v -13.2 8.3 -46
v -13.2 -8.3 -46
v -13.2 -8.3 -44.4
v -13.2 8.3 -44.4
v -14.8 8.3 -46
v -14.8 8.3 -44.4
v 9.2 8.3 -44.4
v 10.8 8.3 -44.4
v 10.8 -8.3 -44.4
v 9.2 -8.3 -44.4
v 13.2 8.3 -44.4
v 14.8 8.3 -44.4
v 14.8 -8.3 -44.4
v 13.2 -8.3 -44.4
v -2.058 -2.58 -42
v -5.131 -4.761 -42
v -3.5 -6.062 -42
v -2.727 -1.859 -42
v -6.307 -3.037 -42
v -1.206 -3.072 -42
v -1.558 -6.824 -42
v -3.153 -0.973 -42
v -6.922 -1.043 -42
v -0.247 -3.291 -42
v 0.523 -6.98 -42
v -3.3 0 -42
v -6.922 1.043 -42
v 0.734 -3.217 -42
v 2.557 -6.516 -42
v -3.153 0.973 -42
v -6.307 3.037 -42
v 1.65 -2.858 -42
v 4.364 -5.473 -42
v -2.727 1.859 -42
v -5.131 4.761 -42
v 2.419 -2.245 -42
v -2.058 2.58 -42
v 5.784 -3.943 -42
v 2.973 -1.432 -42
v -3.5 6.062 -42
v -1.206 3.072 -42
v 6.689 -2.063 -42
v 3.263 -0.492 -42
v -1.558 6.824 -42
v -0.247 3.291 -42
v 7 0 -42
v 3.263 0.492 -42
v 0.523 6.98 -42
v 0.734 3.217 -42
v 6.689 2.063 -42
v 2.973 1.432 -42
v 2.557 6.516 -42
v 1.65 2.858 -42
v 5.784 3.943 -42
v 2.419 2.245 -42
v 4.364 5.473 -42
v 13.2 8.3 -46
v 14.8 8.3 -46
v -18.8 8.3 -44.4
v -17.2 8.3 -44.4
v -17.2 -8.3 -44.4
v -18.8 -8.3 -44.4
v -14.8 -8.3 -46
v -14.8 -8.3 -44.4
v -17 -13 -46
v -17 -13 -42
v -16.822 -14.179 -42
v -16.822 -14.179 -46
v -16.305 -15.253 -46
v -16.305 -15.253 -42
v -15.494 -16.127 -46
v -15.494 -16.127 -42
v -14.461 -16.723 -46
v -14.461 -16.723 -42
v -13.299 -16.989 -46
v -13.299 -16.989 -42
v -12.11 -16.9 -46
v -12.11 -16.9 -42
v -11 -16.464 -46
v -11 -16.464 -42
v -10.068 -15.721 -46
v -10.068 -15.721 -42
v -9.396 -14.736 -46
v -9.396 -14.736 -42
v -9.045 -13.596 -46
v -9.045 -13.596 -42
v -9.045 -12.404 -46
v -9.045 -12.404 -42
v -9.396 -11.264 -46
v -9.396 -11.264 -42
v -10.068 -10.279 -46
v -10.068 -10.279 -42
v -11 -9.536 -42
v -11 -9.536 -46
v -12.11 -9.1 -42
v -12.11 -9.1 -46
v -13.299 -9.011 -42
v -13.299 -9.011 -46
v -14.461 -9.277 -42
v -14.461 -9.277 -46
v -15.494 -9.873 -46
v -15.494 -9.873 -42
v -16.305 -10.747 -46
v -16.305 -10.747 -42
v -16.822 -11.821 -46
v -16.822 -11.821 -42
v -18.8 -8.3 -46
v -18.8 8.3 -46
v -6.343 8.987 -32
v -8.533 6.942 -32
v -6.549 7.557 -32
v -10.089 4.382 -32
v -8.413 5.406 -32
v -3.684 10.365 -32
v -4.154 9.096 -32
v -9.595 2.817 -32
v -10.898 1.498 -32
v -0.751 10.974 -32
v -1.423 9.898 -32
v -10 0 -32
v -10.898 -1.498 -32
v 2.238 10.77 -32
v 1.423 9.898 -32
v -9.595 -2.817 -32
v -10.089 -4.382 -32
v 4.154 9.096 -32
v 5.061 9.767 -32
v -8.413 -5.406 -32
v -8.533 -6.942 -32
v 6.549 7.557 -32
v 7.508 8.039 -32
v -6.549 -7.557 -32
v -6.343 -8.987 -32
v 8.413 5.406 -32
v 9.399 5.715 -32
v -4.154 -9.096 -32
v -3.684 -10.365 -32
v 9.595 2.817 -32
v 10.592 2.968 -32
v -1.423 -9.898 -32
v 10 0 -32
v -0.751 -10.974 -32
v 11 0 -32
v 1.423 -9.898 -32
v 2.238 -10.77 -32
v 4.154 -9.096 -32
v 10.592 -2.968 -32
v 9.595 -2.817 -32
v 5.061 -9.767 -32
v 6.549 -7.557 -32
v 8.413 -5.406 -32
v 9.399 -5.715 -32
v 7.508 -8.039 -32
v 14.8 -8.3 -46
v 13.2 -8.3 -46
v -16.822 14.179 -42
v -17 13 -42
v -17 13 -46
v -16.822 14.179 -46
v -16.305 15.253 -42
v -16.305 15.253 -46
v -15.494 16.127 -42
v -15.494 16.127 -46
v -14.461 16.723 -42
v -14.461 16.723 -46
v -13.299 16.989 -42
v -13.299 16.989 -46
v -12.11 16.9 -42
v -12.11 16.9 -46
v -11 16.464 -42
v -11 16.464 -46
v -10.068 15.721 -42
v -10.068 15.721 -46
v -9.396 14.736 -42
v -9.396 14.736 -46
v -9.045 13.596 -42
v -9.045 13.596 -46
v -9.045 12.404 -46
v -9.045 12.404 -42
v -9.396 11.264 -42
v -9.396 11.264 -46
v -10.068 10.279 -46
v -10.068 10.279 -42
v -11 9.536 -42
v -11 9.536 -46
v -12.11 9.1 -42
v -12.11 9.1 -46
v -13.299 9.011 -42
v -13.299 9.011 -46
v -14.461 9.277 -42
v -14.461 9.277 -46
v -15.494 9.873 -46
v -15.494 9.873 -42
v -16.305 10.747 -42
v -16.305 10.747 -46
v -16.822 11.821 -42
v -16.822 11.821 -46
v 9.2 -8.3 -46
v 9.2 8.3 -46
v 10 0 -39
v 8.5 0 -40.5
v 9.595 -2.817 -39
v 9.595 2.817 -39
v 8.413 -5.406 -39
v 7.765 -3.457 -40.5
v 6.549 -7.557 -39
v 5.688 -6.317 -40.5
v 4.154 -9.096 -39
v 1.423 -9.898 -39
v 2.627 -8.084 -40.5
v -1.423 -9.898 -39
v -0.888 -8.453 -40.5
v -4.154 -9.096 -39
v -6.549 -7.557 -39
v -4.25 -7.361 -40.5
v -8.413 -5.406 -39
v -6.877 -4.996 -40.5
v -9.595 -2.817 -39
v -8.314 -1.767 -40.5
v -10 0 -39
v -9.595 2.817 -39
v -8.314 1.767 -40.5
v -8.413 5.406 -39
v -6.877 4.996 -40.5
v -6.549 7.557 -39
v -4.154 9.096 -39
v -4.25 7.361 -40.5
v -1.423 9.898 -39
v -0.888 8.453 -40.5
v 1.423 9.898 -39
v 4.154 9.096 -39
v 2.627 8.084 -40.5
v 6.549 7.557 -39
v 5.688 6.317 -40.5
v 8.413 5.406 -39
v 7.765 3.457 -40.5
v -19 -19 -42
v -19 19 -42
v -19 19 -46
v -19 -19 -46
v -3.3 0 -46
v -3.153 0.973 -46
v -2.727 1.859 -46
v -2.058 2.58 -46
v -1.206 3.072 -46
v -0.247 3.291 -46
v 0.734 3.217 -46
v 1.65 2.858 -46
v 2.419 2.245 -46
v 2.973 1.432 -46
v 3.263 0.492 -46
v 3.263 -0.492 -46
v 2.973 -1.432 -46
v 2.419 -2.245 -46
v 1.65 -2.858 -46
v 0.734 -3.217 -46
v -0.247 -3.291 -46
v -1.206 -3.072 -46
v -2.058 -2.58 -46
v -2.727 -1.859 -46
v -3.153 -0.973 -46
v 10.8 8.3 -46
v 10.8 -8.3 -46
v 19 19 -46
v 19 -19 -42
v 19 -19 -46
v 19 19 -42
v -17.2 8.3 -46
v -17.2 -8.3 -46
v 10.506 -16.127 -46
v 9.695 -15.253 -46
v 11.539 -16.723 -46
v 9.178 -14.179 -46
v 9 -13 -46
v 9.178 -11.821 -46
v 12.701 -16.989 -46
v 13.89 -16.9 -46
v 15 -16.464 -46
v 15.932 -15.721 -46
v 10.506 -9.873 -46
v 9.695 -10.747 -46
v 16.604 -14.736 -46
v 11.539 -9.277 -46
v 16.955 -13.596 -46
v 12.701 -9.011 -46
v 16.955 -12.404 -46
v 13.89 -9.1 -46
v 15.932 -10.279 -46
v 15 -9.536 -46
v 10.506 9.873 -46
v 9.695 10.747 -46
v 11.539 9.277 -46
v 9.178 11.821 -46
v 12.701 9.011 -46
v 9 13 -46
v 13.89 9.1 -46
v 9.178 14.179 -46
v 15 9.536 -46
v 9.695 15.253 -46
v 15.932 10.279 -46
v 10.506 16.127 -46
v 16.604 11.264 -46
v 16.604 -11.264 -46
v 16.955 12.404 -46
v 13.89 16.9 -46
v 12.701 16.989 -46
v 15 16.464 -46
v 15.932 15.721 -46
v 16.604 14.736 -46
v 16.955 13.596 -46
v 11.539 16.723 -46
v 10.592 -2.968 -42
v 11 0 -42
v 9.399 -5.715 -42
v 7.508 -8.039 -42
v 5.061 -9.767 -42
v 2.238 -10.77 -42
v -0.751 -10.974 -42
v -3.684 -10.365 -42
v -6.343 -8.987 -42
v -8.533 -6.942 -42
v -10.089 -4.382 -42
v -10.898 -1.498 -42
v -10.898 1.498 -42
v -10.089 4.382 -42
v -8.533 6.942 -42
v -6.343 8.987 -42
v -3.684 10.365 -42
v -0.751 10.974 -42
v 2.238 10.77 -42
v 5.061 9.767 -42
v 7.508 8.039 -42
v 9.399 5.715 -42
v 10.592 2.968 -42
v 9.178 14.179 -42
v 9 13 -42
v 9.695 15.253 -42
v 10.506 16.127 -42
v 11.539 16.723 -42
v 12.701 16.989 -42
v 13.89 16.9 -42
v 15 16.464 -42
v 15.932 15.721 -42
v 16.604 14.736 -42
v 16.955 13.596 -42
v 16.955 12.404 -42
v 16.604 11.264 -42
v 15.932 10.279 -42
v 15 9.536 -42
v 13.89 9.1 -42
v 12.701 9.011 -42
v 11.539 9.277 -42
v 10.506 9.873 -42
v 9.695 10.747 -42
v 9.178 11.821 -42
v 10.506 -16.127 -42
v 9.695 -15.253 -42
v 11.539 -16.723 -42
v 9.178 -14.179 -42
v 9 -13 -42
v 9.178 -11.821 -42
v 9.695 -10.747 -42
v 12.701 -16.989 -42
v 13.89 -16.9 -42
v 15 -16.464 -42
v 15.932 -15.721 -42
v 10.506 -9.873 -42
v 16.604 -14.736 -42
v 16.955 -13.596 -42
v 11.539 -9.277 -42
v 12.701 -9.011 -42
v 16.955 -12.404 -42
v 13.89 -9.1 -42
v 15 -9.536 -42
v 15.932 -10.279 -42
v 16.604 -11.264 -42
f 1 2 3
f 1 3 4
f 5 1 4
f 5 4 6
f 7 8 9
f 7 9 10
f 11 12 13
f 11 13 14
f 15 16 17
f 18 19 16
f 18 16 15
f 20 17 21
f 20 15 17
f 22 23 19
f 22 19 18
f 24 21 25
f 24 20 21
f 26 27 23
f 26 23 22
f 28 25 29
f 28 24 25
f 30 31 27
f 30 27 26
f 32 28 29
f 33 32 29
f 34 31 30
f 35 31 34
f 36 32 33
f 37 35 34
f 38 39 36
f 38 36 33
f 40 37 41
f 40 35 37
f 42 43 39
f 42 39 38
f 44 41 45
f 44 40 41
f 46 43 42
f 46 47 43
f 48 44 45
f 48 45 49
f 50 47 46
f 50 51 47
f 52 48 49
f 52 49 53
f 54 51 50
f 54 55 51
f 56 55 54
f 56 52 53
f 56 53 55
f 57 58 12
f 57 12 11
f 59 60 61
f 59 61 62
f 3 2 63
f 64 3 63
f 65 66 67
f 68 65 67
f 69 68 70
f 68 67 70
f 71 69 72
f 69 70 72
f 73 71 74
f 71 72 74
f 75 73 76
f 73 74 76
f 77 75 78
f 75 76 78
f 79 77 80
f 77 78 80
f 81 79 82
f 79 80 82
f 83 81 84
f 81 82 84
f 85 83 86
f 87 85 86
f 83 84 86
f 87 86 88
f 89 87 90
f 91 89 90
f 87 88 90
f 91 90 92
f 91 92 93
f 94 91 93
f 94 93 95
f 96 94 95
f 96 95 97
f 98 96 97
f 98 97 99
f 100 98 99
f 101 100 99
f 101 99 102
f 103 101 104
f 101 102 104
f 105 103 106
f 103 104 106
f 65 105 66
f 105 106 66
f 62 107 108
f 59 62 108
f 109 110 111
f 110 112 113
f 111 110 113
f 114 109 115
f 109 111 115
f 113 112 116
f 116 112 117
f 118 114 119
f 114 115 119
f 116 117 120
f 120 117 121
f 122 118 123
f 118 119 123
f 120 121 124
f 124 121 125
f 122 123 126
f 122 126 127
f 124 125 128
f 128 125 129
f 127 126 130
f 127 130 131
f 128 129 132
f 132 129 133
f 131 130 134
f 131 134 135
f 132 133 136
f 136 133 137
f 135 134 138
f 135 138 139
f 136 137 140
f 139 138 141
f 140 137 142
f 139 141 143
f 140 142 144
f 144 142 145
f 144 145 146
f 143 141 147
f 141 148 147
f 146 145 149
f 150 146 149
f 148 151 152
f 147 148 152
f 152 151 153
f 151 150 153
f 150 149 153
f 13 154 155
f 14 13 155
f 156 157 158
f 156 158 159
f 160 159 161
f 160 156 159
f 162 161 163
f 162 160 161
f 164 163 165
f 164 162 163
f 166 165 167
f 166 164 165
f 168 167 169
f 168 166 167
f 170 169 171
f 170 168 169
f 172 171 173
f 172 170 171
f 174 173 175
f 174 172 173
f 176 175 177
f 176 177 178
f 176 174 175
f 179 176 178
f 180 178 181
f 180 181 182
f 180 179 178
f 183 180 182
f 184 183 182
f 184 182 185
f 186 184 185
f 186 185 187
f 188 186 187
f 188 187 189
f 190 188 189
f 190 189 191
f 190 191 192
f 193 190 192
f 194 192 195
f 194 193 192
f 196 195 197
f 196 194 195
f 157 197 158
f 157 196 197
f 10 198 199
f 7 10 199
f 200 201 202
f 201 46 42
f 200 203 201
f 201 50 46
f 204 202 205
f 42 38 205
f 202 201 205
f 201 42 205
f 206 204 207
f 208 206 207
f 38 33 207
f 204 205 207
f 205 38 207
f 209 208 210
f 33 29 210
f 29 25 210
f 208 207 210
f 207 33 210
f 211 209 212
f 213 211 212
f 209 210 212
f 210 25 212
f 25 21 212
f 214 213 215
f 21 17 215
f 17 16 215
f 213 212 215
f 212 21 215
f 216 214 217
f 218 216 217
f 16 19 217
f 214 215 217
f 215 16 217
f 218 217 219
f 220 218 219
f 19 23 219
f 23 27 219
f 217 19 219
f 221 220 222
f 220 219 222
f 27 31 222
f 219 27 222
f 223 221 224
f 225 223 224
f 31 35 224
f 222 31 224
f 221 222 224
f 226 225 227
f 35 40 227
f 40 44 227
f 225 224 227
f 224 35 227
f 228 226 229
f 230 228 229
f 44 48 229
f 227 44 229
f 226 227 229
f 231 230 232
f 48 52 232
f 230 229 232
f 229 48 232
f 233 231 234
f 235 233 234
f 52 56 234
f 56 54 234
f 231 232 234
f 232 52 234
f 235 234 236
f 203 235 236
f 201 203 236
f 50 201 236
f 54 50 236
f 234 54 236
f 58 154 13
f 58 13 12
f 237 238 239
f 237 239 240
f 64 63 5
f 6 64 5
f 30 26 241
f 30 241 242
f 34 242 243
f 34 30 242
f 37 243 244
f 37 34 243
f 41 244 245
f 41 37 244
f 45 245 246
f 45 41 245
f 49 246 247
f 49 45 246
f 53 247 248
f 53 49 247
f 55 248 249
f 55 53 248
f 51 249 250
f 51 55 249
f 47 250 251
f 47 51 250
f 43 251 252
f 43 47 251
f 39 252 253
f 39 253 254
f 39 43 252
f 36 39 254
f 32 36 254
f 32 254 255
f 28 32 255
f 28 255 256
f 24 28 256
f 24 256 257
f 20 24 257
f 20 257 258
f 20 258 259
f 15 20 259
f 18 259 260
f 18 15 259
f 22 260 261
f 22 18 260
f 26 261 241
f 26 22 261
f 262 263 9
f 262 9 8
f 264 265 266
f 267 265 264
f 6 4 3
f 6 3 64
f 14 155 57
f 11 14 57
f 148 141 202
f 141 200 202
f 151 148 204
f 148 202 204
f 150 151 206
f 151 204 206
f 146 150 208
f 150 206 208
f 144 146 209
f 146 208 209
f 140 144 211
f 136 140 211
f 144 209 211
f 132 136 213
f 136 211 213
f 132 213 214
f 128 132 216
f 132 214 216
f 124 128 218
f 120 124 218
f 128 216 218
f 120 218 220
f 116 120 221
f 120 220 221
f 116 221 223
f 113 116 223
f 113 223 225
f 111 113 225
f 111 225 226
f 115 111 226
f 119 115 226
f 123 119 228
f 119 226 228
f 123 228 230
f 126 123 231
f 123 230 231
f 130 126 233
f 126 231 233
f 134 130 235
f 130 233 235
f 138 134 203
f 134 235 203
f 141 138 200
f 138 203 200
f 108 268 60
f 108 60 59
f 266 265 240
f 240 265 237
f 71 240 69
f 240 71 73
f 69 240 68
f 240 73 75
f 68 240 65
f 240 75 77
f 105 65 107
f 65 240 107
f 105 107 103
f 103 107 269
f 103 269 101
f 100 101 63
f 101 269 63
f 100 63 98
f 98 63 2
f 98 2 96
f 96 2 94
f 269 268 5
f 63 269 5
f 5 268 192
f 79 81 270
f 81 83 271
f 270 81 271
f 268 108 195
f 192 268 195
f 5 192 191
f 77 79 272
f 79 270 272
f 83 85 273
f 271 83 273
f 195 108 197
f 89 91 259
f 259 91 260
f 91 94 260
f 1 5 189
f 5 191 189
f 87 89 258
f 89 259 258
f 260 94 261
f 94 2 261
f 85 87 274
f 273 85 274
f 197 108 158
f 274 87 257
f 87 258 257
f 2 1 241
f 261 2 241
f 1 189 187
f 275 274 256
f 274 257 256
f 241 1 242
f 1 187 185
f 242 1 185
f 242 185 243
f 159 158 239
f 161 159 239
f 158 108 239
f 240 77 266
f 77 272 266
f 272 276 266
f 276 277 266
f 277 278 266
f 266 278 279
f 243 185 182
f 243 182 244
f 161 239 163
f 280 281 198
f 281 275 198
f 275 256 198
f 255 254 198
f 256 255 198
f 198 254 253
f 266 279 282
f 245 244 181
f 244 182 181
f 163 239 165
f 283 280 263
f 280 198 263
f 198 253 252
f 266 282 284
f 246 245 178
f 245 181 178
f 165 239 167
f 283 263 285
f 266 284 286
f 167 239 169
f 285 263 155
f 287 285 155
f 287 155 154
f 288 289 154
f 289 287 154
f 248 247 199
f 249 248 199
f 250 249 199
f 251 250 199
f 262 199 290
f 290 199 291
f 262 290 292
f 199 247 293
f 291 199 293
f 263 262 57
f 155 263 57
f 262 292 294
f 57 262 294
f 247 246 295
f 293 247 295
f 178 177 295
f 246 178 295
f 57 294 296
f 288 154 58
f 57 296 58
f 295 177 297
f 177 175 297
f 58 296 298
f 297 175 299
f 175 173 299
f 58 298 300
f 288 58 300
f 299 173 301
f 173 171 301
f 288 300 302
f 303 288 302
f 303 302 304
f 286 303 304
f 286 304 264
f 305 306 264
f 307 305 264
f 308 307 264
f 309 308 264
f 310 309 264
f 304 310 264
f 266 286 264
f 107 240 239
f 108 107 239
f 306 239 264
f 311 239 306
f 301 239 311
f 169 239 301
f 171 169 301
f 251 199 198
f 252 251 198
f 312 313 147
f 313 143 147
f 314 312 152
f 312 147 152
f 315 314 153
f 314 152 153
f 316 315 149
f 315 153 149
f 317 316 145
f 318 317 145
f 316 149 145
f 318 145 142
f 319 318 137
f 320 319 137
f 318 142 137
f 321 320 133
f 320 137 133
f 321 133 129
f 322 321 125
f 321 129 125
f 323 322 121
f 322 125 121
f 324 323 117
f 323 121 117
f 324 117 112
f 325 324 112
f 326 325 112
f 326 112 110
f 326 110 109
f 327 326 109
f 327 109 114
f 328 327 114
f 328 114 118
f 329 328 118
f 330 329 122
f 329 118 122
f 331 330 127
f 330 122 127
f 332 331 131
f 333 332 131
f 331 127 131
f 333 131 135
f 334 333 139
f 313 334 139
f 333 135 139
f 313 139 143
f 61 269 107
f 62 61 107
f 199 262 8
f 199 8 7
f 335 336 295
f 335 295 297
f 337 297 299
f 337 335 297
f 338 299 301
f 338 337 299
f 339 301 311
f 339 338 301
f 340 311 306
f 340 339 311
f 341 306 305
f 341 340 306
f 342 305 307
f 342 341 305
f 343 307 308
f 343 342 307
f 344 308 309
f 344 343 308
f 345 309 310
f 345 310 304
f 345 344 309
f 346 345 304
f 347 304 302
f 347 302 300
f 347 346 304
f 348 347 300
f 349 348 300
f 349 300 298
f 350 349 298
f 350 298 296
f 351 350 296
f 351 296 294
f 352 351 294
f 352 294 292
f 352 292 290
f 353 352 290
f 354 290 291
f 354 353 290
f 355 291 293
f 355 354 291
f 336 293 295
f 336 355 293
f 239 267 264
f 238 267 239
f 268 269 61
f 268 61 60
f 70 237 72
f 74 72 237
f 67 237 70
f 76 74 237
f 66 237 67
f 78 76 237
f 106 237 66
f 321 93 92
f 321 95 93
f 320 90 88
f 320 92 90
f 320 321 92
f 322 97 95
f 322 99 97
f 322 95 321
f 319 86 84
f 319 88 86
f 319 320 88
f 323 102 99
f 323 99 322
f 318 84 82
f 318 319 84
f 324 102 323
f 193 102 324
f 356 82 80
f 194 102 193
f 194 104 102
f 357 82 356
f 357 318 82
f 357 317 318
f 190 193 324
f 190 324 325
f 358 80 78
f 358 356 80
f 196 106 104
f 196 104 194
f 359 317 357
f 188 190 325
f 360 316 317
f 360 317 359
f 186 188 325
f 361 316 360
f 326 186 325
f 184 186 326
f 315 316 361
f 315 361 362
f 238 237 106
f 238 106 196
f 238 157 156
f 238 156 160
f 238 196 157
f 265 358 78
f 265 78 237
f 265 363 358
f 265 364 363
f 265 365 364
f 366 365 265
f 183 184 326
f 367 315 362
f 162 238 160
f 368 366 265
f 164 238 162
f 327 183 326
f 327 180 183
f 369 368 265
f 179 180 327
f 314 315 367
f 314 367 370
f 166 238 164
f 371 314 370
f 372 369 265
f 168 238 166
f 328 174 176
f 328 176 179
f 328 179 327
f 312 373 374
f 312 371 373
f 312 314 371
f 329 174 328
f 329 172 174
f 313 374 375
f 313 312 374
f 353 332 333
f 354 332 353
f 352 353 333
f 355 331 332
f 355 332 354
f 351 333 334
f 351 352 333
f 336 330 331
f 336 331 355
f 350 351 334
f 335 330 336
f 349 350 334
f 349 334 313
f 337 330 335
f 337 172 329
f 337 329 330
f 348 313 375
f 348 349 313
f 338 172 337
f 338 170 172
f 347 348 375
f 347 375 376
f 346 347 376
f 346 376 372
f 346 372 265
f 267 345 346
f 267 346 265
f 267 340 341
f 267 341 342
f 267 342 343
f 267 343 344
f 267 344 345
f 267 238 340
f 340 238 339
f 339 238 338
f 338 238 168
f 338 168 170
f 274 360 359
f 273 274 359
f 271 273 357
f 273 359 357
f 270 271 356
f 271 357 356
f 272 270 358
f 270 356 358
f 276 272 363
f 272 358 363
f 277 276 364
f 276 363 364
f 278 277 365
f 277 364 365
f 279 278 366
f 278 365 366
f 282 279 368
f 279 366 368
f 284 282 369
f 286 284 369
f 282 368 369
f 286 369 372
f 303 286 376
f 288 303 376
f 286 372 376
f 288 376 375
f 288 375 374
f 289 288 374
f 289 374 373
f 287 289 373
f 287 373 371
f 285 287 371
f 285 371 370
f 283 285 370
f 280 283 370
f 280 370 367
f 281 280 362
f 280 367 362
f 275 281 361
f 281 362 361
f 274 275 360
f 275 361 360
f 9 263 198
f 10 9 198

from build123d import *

# Parameters (mm, degrees)
SKETCH012_W             = 1.6
SKETCH012_H             = 8.3
EXTRUDE011_DEPTH        = 1.6
SKETCH008_R             = 4
EXTRUDE007_DEPTH        = 4
BODY004_PLACEMENT_ANGLE = 180


with BuildPart() as extrude011:
    # Sketch012 → Extrude011 (new body)
    with BuildSketch(Plane.XY.offset(5)):
        with Locations((14, 4.15)):
            Rectangle(SKETCH012_W, SKETCH012_H)
        with Locations((18, 4.15)):
            Rectangle(SKETCH012_W, SKETCH012_H)
        with Locations((-10, 4.15)):
            Rectangle(SKETCH012_W, SKETCH012_H)
        with Locations((-14, 4.15)):
            Rectangle(SKETCH012_W, SKETCH012_H)
    extrude(amount=-EXTRUDE011_DEPTH)


with BuildPart() as extrude011_1:
    # Extrude011 placement: moved
    add(extrude011.part.moved(Location((0, 0, -1))))


with BuildPart() as cut:
    # Sketch008 → Extrude007 (new body)
    with BuildSketch(Plane.XY):
        with BuildLine():
            ThreePointArc((3.3, 0), (0, 3.3), (-3.3, 0))
            Line((-3.3, 0), (-19, 0))
            Line((-19, 0), (-19, 19))
            Line((-19, 19), (19, 19))
            Line((19, 19), (19, 0))
            Line((3.3, 0), (19, 0))
        make_face()
        with Locations((-13, 13)):
            Circle(SKETCH008_R, mode=Mode.SUBTRACT)
        with Locations((13, 13)):
            Circle(SKETCH008_R, mode=Mode.SUBTRACT)
    extrude(amount=EXTRUDE007_DEPTH)

    # Cut: cut Extrude011
    add(extrude011_1.part, mode=Mode.SUBTRACT)


with BuildPart() as revolve001:
    # Sketch014 → Revolve001 (revolve)
    with BuildSketch(Plane.XZ):
        Polygon((-11, 0), (-11, -10), (-10, -10), (-10, -3), (-7, 0), align=None)
    revolve(axis=Axis((0, 0, 0), (0, 0, 1)))


with BuildPart() as body:
    # Body base: copy of Cut
    add(cut.part)


with BuildPart() as body004:
    # Part__Mirroring: instance of Body
    add(body.part.mirror(Plane(origin=(0, 0, 0), x_dir=(1, 0, 0), z_dir=(0, 1, 0))))

    # Fusion004: union Cut, Revolve001
    add(cut.part)
    add(revolve001.part)


with BuildPart() as body004_1:
    # Body004 placement: moved
    add(body004.part.moved(Location((0, 0, -42))).rotate(Axis((0, 0, -42), (0, 1, 0)), BODY004_PLACEMENT_ANGLE))


solid = body004_1.part
